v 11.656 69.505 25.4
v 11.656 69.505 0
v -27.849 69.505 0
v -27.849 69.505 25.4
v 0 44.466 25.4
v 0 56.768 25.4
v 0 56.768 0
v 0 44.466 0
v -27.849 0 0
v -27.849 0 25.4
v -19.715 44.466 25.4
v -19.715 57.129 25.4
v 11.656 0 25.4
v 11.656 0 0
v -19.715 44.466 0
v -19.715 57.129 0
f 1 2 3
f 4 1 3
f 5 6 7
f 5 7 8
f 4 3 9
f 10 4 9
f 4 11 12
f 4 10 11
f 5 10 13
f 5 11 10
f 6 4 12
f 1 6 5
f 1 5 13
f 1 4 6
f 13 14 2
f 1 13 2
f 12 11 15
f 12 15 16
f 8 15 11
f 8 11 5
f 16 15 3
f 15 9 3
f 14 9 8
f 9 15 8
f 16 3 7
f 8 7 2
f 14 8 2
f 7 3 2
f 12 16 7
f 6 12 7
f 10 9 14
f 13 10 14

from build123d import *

# Parameters (mm, degrees)
F0_W     = 19.7146944702
F0_H     = 44.4659888744
F0_W_2   = 8.1341895928
F1_DEPTH = 25.4


with BuildPart() as f1:
    # F0 (on Top) → F1 (new body)
    with BuildSketch(Plane.XY):
        Polygon((11.6561325267, 0), (11.6561325267, 56.5538331866), (0, 44.4659888744), (0, 0), align=None)
        Polygon((0, 44.4659888744), (11.6561325267, 56.5538331866), (0, 56.7677064351), align=None)
        Polygon((0, 56.7677064351), (11.6561325267, 56.5538331866), (11.6561325267, 69.5050880313), (0, 69.5050880313), align=None)
        with Locations((-9.8573472351, 22.2329944372)):
            Rectangle(F0_W, F0_H)
        Polygon((-19.7146944702, 57.1294426918), (0, 56.7677064351), (0, 69.5050880313), (-27.848884063, 69.5050880313), (-27.848884063, 44.4659888744), align=None)
        Polygon((-19.7146944702, 44.4659888744), (-19.7146944702, 57.1294426918), (-27.848884063, 44.4659888744), align=None)
        with Locations((-23.7817892666, 22.2329944372)):
            Rectangle(F0_W_2, F0_H)
    extrude(amount=F1_DEPTH)


solid = f1.part
